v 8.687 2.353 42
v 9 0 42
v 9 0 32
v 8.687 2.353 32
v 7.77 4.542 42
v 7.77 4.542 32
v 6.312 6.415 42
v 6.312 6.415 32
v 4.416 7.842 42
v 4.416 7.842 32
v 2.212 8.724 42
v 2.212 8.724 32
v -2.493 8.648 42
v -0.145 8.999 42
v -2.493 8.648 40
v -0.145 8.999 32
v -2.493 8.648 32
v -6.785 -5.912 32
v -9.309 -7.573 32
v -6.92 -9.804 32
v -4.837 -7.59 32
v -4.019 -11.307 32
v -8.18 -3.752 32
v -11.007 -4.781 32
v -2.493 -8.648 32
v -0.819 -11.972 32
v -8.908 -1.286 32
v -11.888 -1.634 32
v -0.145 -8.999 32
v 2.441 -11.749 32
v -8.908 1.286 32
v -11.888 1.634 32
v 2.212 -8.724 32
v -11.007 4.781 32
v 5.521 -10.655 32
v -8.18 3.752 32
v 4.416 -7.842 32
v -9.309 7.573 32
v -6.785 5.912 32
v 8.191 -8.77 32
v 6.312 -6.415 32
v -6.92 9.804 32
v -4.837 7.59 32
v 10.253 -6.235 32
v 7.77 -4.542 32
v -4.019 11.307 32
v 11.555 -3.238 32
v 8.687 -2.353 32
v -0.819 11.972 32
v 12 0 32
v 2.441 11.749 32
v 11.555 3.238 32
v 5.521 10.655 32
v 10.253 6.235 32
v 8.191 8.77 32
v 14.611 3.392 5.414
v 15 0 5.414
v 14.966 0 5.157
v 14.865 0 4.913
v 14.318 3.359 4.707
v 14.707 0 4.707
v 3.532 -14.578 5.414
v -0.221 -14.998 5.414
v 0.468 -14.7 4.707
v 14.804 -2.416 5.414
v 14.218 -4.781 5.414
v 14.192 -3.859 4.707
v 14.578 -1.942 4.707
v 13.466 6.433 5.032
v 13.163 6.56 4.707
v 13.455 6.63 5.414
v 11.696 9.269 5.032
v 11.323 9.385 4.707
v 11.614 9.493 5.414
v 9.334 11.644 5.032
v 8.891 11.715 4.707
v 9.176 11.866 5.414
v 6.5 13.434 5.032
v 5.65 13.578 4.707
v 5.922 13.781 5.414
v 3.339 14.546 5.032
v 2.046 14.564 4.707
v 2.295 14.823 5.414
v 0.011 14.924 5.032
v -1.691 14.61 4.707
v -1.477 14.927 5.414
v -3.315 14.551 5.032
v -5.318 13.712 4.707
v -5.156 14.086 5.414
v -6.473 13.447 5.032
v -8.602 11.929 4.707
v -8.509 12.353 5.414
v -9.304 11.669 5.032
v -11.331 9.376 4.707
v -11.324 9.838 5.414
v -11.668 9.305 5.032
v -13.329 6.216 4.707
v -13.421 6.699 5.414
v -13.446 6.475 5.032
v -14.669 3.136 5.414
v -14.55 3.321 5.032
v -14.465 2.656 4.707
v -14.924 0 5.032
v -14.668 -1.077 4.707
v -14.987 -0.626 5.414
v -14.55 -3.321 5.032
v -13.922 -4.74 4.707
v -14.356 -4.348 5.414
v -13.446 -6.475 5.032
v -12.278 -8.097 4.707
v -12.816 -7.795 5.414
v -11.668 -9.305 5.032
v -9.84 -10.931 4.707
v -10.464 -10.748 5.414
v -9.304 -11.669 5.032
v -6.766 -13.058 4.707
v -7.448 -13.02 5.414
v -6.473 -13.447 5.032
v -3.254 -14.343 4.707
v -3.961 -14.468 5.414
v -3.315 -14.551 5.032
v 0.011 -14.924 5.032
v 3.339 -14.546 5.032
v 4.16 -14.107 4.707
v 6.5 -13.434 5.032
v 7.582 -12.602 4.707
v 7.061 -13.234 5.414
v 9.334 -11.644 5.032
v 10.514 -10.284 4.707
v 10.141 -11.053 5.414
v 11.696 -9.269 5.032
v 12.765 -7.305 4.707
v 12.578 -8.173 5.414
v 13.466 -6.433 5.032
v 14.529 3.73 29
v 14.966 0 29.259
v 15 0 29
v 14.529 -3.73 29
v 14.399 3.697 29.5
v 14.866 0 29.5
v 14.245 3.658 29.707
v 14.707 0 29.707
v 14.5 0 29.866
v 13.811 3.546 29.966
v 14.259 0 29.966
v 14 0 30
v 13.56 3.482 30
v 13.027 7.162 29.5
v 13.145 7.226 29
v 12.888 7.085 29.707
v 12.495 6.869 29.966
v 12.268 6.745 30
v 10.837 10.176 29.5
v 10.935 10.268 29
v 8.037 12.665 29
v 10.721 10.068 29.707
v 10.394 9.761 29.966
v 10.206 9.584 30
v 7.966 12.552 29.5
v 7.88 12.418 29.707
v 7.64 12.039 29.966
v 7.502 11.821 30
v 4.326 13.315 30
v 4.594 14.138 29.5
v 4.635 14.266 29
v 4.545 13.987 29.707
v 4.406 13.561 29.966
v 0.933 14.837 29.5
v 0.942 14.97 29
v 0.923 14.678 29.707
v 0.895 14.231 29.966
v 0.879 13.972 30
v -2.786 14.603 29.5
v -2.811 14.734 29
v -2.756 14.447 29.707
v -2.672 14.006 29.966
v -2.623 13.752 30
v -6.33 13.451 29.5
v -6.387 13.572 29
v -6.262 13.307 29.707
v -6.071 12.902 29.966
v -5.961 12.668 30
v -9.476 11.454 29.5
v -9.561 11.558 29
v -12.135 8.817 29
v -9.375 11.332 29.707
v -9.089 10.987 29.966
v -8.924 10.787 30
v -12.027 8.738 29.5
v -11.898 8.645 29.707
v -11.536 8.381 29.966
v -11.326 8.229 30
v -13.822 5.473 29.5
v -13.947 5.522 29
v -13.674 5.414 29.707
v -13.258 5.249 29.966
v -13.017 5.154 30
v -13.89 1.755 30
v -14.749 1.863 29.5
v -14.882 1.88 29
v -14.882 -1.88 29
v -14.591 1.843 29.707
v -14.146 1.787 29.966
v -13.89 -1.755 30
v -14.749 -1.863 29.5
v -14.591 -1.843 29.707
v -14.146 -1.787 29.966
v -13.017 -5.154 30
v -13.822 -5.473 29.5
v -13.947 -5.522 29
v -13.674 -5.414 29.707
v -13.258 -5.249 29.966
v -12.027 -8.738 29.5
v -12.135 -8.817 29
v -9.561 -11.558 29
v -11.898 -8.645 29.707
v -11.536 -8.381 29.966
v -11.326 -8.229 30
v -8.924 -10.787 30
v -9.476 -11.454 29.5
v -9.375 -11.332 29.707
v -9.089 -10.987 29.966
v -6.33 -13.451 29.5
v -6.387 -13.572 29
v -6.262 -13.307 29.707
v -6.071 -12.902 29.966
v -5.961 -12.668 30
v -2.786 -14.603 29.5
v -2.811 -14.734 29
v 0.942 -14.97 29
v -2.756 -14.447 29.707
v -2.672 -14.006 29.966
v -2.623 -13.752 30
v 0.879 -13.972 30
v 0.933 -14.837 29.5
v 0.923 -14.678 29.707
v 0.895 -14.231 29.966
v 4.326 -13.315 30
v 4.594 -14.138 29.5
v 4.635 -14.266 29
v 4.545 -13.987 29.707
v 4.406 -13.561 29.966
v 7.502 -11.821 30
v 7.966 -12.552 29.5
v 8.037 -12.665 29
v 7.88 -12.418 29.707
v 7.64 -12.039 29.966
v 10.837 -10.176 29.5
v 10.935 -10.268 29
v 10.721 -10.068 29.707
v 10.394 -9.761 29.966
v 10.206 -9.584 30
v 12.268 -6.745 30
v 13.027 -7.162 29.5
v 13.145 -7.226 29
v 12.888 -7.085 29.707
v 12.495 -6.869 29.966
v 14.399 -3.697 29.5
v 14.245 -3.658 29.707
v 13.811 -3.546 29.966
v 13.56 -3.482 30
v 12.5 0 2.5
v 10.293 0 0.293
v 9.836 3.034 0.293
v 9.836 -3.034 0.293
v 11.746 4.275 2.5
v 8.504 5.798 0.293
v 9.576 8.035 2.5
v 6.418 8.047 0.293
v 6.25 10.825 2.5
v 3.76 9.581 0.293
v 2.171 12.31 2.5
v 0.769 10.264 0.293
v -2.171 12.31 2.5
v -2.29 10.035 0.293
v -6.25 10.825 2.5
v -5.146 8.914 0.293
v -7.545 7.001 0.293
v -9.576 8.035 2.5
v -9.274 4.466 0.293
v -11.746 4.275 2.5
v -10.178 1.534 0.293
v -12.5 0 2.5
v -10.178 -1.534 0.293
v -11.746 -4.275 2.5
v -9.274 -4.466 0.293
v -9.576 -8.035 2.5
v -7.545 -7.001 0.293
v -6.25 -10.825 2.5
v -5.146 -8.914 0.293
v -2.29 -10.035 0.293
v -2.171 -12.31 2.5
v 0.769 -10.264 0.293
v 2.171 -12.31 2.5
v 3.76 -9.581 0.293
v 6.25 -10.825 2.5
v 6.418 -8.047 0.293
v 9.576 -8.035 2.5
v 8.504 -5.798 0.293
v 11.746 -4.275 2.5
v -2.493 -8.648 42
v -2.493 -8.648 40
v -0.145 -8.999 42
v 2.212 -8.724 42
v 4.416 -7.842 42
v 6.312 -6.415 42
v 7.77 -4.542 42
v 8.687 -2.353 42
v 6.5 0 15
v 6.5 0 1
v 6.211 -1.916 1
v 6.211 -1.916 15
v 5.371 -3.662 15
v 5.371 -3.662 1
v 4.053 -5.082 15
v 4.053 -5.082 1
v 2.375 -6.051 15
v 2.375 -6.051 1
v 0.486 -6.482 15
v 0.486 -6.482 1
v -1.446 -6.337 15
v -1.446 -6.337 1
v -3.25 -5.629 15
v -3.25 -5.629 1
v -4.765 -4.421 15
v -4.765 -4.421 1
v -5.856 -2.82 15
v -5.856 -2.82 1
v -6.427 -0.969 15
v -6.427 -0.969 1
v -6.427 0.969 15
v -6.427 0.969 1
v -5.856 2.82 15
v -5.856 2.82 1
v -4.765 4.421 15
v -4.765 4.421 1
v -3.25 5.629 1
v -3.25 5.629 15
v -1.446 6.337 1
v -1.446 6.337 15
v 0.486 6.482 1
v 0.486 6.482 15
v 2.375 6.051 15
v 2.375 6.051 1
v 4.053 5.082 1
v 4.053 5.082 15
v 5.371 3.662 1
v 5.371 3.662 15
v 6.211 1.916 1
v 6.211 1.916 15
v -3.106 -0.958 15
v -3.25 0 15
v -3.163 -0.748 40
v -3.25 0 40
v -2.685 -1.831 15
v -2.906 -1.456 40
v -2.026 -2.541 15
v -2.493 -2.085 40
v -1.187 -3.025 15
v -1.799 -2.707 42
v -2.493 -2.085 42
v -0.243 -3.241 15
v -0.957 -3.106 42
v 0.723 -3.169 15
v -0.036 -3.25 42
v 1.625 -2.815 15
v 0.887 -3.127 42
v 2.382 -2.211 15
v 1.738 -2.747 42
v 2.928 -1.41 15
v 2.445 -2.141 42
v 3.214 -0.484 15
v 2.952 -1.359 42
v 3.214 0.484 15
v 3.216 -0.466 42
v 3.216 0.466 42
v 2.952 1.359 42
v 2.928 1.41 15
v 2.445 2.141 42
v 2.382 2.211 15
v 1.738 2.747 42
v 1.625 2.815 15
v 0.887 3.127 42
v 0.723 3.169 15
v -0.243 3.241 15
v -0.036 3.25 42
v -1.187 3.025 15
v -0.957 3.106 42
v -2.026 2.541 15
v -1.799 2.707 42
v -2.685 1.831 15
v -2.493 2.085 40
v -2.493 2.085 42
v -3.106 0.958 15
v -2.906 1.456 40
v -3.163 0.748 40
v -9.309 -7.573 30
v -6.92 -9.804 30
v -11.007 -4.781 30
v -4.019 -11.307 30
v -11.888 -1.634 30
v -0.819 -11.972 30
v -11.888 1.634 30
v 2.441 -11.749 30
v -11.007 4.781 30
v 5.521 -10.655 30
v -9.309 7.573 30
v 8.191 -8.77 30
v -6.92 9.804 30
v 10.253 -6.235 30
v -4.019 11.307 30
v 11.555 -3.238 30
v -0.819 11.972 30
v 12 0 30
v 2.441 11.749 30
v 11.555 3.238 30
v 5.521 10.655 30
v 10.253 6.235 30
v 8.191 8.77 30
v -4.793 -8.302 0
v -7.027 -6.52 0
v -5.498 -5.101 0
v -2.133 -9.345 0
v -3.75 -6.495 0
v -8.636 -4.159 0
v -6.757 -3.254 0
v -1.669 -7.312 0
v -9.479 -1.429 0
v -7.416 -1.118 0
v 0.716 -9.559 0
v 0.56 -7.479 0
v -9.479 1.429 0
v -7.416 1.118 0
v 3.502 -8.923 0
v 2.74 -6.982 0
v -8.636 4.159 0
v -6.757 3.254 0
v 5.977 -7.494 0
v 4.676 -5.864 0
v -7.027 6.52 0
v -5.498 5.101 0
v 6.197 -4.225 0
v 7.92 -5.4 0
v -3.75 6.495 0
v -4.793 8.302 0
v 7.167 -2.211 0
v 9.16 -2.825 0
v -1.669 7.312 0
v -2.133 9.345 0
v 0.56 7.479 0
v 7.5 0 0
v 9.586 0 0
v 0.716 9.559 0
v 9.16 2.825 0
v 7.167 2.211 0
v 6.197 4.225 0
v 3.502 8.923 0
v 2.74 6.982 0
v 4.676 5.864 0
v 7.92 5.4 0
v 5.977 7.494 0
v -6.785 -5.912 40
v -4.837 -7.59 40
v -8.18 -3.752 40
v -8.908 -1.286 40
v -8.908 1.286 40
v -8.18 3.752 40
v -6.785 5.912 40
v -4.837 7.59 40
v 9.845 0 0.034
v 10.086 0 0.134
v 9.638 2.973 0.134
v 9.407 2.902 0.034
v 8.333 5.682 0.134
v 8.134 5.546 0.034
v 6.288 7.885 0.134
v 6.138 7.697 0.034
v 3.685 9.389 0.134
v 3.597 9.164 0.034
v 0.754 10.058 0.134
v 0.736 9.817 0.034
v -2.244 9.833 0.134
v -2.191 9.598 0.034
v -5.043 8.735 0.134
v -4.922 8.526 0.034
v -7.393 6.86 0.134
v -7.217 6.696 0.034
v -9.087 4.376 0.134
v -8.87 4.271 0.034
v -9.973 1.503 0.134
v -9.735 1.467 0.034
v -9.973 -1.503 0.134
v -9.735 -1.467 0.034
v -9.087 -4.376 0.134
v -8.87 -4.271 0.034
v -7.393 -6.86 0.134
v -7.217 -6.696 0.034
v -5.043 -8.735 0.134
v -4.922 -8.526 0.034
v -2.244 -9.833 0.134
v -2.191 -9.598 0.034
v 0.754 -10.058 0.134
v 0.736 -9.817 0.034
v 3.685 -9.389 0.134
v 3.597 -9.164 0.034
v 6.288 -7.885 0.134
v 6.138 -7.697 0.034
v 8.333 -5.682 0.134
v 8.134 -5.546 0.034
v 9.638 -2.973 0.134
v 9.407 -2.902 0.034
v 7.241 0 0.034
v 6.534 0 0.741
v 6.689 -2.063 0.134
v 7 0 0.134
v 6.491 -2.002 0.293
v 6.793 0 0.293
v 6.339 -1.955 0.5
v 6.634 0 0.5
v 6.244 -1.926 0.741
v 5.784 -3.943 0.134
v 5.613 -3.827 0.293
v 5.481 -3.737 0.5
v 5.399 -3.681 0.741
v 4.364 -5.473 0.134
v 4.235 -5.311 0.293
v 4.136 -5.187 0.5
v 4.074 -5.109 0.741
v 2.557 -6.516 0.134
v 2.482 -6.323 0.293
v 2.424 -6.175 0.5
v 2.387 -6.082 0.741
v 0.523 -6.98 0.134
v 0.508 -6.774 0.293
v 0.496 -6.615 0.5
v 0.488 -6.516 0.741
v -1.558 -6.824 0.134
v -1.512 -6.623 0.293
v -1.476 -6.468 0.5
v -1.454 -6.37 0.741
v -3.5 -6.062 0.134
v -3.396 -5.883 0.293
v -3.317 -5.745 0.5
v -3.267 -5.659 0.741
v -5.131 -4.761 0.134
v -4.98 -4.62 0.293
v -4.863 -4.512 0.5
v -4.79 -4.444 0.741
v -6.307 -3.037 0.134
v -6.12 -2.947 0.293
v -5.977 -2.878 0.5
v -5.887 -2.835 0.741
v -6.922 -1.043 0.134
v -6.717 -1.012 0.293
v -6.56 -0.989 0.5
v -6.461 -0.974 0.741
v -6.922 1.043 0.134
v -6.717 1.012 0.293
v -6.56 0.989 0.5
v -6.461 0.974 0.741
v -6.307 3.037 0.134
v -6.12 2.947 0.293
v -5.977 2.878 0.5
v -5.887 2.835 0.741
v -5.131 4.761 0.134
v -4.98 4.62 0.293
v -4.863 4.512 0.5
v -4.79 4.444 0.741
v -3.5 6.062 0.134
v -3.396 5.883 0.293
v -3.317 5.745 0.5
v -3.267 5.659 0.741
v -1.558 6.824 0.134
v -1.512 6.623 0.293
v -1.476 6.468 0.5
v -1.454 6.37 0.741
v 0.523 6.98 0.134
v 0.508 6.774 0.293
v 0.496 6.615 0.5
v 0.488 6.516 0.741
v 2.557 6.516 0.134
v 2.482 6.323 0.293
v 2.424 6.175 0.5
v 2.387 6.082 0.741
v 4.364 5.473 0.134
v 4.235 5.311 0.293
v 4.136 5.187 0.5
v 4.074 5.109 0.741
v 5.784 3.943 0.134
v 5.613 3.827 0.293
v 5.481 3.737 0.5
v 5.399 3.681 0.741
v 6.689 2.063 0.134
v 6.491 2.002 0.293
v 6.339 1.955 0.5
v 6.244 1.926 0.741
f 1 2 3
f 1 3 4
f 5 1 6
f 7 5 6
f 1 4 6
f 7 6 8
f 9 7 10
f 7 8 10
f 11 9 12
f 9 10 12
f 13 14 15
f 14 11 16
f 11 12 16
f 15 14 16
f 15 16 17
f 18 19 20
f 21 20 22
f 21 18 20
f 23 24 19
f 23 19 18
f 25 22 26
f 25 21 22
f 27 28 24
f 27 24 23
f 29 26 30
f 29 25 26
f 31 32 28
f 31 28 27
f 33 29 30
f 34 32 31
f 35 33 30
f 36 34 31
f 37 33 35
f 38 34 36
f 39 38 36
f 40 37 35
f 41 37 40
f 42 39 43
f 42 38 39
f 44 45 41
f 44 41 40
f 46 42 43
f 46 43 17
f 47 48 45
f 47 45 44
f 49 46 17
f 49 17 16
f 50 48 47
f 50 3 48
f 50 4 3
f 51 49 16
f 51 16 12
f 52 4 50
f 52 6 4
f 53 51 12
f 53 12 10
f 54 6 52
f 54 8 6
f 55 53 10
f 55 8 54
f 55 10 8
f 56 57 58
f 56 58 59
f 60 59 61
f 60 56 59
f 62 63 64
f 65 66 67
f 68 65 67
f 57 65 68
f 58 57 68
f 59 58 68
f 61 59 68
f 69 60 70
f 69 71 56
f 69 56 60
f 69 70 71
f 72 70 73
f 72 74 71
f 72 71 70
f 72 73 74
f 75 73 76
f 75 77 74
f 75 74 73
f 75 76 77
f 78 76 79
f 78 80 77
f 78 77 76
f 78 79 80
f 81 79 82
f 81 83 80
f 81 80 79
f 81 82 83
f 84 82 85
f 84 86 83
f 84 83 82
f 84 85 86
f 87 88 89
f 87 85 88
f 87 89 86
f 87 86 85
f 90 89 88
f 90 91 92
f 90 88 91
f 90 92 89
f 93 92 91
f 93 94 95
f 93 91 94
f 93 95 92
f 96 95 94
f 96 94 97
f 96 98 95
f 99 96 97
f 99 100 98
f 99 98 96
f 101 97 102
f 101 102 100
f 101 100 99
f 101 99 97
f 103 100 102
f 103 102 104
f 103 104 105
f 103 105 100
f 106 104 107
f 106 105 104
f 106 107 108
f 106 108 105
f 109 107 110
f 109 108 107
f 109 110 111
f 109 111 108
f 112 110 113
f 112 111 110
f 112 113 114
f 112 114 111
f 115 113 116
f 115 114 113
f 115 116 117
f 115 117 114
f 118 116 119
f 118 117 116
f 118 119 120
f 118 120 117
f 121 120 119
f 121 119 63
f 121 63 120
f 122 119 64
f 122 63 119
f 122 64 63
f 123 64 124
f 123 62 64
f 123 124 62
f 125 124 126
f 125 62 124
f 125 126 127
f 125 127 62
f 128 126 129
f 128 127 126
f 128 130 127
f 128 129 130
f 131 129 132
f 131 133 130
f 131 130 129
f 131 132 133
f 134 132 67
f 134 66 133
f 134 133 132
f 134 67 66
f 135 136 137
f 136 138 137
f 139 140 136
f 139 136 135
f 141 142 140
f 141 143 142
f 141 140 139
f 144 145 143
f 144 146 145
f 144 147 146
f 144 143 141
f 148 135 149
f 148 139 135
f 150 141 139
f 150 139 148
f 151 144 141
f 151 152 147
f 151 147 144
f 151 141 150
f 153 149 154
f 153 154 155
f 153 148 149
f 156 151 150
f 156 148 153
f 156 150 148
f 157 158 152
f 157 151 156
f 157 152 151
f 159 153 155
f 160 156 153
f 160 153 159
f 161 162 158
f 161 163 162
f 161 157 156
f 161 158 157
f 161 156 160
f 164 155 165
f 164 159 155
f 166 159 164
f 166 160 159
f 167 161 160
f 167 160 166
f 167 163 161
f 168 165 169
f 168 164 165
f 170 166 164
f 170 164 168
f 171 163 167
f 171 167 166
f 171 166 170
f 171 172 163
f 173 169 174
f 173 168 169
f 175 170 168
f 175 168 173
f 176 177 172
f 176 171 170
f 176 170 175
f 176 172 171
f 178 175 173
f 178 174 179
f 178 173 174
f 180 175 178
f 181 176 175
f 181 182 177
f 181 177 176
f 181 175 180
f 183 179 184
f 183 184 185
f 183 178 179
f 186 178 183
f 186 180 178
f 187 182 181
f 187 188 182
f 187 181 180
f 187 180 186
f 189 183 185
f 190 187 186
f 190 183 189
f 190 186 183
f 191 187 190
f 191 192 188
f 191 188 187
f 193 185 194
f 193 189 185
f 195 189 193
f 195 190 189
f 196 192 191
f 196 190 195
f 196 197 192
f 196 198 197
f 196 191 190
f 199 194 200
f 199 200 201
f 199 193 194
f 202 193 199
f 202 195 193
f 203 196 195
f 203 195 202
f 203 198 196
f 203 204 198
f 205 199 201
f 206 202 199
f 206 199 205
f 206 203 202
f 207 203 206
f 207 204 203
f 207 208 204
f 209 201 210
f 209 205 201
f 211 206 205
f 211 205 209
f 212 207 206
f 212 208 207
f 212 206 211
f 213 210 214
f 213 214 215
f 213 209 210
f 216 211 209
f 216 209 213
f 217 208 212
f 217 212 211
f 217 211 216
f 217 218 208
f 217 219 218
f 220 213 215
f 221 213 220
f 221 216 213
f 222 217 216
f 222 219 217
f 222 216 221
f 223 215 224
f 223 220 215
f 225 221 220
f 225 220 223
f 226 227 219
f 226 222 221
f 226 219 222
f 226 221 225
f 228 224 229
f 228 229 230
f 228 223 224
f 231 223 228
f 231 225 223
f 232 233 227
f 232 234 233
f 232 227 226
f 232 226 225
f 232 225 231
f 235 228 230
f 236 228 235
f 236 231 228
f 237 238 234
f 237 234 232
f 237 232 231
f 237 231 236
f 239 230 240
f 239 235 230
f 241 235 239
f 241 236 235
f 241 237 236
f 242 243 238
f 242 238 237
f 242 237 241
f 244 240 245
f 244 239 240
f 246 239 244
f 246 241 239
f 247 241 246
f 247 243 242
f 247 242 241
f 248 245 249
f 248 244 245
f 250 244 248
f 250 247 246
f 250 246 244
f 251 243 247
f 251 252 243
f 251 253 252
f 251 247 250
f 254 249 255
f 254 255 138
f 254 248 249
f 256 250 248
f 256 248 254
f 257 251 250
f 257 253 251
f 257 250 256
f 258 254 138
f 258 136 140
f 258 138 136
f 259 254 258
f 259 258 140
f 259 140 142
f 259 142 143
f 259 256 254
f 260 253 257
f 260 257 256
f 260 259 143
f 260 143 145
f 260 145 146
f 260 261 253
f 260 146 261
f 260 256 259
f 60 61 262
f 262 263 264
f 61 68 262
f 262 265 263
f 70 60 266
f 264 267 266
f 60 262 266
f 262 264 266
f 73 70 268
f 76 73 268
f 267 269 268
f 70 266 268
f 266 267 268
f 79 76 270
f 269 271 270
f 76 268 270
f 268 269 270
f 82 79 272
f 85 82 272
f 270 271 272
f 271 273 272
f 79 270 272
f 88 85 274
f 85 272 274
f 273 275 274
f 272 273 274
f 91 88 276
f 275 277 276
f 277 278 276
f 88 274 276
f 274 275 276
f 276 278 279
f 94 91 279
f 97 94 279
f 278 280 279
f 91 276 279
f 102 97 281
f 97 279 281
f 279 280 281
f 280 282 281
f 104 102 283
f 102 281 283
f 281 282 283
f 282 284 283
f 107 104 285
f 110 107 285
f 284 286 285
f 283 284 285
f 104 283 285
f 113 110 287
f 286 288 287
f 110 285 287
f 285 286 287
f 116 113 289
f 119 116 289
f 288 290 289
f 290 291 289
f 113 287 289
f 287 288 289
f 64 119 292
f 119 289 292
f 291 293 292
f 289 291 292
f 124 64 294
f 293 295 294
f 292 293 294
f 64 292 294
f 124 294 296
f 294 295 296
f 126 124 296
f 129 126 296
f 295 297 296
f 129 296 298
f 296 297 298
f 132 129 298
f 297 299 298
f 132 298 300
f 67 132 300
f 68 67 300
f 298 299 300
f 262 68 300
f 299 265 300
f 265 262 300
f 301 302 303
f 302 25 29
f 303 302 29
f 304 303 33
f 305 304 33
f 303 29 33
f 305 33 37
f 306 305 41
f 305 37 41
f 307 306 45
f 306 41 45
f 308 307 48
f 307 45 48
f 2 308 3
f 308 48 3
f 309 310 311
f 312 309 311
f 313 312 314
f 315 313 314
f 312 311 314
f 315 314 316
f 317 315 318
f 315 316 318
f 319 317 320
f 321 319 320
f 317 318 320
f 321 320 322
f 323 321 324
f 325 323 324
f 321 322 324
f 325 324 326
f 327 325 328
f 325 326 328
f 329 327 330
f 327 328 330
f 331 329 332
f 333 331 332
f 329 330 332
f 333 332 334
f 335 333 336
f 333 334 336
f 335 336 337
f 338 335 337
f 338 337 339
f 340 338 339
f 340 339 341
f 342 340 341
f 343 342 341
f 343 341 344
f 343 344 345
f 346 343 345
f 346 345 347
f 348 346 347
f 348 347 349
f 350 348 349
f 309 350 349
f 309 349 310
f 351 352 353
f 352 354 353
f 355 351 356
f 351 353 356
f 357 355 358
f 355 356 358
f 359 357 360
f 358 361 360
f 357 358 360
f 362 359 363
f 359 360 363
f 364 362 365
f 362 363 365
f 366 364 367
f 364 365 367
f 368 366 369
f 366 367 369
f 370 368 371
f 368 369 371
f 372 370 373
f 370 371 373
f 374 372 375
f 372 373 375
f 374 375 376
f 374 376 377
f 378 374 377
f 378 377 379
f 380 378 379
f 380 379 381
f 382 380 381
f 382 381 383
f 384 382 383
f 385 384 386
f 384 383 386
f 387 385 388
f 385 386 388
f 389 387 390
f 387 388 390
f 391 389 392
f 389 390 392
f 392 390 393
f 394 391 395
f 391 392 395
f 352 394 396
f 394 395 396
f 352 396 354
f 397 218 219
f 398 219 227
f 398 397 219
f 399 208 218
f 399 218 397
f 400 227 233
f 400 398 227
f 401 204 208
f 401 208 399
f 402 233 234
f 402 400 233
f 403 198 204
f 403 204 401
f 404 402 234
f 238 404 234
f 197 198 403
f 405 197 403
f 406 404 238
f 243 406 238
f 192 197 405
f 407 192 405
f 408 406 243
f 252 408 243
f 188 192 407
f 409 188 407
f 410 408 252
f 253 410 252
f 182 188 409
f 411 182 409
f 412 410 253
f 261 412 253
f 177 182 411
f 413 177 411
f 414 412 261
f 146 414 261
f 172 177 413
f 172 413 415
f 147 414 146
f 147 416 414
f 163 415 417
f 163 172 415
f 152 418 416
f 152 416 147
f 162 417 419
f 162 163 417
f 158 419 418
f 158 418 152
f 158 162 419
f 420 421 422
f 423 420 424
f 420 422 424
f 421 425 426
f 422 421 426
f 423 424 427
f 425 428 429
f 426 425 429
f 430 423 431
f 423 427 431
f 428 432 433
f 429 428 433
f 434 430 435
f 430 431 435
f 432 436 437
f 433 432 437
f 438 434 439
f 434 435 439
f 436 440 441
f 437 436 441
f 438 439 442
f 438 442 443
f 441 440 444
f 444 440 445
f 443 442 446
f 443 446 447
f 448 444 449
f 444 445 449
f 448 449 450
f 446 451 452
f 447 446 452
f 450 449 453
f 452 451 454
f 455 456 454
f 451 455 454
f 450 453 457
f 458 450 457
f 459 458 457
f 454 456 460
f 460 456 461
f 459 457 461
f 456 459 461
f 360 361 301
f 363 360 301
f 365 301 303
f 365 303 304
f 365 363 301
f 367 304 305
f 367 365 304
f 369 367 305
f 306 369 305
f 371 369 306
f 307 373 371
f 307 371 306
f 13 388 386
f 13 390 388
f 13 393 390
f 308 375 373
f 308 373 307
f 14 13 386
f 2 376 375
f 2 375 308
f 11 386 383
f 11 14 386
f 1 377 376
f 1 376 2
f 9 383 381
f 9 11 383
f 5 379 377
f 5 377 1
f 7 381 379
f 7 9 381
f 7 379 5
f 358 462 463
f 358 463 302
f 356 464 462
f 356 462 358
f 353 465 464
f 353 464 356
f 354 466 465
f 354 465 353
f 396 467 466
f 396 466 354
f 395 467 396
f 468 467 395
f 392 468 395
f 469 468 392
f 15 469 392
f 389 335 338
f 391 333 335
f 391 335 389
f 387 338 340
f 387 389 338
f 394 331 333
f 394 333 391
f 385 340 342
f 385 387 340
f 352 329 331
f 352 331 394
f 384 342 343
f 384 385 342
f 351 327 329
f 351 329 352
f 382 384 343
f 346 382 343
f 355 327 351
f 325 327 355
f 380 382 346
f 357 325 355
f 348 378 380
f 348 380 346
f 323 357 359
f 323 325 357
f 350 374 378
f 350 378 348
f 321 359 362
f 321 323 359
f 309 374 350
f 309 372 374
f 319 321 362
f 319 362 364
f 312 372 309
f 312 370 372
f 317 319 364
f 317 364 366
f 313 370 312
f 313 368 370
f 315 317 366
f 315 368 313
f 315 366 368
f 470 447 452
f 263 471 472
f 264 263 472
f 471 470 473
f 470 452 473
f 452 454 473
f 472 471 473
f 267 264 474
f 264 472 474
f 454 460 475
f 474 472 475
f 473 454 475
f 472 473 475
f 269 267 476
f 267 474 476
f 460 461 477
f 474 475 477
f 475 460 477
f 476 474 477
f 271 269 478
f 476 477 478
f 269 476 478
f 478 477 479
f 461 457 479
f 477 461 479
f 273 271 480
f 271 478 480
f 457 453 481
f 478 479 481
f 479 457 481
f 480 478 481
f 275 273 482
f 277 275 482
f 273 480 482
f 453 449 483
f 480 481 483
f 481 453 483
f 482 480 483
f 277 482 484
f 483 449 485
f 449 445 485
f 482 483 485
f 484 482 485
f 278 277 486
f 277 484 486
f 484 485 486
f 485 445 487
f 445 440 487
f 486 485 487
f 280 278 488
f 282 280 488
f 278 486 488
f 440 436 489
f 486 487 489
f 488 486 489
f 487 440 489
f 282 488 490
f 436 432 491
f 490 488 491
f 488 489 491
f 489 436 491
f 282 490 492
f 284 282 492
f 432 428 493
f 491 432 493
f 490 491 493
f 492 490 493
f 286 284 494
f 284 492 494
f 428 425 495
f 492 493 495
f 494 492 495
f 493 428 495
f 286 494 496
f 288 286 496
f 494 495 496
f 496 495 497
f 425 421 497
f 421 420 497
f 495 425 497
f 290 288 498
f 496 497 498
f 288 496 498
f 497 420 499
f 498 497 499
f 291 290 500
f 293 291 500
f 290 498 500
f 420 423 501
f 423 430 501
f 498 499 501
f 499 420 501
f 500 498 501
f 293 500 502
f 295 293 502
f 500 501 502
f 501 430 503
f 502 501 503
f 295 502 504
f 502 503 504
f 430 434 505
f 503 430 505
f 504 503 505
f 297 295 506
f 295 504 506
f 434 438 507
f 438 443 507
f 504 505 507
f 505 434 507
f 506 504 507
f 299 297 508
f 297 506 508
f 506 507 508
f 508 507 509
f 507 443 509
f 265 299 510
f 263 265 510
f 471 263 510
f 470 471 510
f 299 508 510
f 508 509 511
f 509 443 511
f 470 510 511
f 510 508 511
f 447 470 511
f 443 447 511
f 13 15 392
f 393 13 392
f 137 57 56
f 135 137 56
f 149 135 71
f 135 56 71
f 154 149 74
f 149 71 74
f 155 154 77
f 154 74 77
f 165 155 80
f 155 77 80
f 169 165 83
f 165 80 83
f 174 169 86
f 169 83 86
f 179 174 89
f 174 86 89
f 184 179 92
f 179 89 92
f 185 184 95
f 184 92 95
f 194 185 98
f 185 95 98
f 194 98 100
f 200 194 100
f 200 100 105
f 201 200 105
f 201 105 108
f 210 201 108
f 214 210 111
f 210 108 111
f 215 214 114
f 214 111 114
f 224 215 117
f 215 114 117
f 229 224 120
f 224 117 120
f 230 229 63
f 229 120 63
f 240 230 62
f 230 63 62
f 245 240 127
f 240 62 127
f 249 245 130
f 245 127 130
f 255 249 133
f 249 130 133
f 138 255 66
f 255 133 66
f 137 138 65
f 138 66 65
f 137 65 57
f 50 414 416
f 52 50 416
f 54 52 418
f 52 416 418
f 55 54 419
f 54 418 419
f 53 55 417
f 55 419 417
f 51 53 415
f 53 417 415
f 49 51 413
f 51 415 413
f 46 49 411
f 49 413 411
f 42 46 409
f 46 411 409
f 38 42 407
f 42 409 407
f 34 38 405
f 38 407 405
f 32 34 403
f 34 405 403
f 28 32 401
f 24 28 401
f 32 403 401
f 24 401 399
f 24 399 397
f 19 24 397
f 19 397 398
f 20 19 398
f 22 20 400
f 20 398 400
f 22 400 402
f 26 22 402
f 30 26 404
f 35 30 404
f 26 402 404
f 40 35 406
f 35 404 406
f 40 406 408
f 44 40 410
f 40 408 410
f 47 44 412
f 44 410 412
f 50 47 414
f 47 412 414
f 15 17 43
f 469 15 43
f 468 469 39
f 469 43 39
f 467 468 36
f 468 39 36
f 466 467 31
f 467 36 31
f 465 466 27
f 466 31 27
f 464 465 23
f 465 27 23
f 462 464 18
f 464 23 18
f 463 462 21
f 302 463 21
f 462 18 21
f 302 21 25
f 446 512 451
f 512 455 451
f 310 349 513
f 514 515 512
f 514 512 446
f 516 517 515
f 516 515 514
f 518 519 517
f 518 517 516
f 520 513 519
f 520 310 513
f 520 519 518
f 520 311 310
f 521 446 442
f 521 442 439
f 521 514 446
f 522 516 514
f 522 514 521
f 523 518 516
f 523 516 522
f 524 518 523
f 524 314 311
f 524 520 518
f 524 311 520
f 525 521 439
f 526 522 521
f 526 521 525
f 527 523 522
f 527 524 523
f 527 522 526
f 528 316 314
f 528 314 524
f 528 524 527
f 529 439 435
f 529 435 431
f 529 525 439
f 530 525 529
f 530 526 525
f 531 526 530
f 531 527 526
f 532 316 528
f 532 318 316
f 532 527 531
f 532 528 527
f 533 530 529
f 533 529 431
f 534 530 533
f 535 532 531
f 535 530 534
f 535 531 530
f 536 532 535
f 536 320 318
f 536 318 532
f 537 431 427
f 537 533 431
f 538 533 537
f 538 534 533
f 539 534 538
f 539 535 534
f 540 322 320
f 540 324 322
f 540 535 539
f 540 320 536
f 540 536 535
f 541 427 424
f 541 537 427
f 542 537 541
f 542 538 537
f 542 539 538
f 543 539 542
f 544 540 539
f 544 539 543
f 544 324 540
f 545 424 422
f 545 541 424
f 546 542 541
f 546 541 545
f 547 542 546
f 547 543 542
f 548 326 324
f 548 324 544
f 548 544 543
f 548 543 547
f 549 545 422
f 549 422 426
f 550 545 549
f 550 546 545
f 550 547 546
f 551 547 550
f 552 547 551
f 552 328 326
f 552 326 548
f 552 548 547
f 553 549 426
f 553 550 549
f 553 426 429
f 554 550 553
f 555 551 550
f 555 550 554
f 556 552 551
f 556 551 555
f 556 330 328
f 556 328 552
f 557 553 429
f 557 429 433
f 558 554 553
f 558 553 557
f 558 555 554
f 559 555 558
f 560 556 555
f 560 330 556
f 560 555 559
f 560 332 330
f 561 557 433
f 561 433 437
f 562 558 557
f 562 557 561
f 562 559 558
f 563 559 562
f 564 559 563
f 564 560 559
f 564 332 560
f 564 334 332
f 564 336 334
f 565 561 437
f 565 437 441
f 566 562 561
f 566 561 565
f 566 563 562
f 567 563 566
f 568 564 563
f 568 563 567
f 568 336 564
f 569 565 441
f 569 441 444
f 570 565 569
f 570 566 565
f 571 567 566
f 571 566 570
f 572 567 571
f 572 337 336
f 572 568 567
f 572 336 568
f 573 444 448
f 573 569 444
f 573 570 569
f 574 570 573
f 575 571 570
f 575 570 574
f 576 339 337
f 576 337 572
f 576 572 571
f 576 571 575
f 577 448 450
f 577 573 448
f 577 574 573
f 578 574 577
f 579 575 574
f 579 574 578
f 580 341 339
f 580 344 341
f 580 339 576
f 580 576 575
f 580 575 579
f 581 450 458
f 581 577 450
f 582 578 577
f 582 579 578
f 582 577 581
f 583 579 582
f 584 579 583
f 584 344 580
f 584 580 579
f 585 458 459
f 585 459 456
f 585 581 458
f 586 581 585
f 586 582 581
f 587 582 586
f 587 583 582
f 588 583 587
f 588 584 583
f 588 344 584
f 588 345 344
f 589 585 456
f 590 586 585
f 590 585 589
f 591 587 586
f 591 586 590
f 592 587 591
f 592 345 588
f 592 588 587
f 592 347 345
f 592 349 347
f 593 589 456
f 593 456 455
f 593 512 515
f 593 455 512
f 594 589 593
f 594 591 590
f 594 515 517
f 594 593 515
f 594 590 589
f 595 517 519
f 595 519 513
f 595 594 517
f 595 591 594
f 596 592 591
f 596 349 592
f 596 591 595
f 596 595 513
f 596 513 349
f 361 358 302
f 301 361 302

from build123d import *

# Parameters (mm, degrees)
F0_R           = 15
F1_DEPTH       = 30
F2_R           = 12
F3_DEPTH       = 2
F5_DEPTH       = 10
F6_DEPTH       = 8
F7_D           = 6.5
F7_CBORE_D     = 13
F7_CBORE_DEPTH = 15
F8_SIZE        = 5
F9_R           = 1


with BuildPart() as f1:
    # F0 (on Top) → F1 (new body)
    with BuildSketch(Plane.XY):
        Circle(F0_R)
    extrude(amount=F1_DEPTH)

    # F2 (on face) → F3 (join)
    with BuildSketch(Plane.XY.offset(30)):
        Circle(F2_R)
    extrude(amount=F3_DEPTH)

    # F4 (on face) → F5 (join)
    with BuildSketch(Plane.XY.offset(32)):
        with BuildLine():
            ThreePointArc((-2.492736493, -8.6479052248), (5.411347871, -7.1914751073), (9, 0))
            ThreePointArc((9, 0), (5.411347871, 7.1914751073), (-2.492736493, 8.6479052248))
            Line((-2.492736493, 8.6479052248), (-2.492736493, -8.6479052248))
        make_face()
    extrude(amount=F5_DEPTH)

    # F4 (on face) → F6 (join)
    with BuildSketch(Plane.XY.offset(32)):
        with BuildLine():
            Line((-2.492736493, -8.6479052248), (-2.492736493, 8.6479052248))
            ThreePointArc((-2.492736493, 8.6479052248), (-9, 0), (-2.492736493, -8.6479052248))
        make_face()
    extrude(amount=F6_DEPTH)

    # F7 (through all)
    with Locations(Plane(origin=(0, 0, 0), x_dir=(1, 0, 0), z_dir=(0, 0, -1))):
        with Locations((0, 0)):
            CounterBoreHole(F7_D / 2, F7_CBORE_D / 2, F7_CBORE_DEPTH)

    # F8
    f8_edges = [f1.edges().sort_by_distance(p)[0] for p in [
        (-15, 0, 0),
    ]]
    chamfer(f8_edges, length=F8_SIZE)

    # F9
    f9_edges = [f1.edges().sort_by_distance(p)[0] for p in [
        (-15, 0, 30),
        (-10, 0, 0),
        (-15, 0, 5),
        (-6.5, 0, 0),
    ]]
    fillet(f9_edges, radius=F9_R)


solid = f1.part
